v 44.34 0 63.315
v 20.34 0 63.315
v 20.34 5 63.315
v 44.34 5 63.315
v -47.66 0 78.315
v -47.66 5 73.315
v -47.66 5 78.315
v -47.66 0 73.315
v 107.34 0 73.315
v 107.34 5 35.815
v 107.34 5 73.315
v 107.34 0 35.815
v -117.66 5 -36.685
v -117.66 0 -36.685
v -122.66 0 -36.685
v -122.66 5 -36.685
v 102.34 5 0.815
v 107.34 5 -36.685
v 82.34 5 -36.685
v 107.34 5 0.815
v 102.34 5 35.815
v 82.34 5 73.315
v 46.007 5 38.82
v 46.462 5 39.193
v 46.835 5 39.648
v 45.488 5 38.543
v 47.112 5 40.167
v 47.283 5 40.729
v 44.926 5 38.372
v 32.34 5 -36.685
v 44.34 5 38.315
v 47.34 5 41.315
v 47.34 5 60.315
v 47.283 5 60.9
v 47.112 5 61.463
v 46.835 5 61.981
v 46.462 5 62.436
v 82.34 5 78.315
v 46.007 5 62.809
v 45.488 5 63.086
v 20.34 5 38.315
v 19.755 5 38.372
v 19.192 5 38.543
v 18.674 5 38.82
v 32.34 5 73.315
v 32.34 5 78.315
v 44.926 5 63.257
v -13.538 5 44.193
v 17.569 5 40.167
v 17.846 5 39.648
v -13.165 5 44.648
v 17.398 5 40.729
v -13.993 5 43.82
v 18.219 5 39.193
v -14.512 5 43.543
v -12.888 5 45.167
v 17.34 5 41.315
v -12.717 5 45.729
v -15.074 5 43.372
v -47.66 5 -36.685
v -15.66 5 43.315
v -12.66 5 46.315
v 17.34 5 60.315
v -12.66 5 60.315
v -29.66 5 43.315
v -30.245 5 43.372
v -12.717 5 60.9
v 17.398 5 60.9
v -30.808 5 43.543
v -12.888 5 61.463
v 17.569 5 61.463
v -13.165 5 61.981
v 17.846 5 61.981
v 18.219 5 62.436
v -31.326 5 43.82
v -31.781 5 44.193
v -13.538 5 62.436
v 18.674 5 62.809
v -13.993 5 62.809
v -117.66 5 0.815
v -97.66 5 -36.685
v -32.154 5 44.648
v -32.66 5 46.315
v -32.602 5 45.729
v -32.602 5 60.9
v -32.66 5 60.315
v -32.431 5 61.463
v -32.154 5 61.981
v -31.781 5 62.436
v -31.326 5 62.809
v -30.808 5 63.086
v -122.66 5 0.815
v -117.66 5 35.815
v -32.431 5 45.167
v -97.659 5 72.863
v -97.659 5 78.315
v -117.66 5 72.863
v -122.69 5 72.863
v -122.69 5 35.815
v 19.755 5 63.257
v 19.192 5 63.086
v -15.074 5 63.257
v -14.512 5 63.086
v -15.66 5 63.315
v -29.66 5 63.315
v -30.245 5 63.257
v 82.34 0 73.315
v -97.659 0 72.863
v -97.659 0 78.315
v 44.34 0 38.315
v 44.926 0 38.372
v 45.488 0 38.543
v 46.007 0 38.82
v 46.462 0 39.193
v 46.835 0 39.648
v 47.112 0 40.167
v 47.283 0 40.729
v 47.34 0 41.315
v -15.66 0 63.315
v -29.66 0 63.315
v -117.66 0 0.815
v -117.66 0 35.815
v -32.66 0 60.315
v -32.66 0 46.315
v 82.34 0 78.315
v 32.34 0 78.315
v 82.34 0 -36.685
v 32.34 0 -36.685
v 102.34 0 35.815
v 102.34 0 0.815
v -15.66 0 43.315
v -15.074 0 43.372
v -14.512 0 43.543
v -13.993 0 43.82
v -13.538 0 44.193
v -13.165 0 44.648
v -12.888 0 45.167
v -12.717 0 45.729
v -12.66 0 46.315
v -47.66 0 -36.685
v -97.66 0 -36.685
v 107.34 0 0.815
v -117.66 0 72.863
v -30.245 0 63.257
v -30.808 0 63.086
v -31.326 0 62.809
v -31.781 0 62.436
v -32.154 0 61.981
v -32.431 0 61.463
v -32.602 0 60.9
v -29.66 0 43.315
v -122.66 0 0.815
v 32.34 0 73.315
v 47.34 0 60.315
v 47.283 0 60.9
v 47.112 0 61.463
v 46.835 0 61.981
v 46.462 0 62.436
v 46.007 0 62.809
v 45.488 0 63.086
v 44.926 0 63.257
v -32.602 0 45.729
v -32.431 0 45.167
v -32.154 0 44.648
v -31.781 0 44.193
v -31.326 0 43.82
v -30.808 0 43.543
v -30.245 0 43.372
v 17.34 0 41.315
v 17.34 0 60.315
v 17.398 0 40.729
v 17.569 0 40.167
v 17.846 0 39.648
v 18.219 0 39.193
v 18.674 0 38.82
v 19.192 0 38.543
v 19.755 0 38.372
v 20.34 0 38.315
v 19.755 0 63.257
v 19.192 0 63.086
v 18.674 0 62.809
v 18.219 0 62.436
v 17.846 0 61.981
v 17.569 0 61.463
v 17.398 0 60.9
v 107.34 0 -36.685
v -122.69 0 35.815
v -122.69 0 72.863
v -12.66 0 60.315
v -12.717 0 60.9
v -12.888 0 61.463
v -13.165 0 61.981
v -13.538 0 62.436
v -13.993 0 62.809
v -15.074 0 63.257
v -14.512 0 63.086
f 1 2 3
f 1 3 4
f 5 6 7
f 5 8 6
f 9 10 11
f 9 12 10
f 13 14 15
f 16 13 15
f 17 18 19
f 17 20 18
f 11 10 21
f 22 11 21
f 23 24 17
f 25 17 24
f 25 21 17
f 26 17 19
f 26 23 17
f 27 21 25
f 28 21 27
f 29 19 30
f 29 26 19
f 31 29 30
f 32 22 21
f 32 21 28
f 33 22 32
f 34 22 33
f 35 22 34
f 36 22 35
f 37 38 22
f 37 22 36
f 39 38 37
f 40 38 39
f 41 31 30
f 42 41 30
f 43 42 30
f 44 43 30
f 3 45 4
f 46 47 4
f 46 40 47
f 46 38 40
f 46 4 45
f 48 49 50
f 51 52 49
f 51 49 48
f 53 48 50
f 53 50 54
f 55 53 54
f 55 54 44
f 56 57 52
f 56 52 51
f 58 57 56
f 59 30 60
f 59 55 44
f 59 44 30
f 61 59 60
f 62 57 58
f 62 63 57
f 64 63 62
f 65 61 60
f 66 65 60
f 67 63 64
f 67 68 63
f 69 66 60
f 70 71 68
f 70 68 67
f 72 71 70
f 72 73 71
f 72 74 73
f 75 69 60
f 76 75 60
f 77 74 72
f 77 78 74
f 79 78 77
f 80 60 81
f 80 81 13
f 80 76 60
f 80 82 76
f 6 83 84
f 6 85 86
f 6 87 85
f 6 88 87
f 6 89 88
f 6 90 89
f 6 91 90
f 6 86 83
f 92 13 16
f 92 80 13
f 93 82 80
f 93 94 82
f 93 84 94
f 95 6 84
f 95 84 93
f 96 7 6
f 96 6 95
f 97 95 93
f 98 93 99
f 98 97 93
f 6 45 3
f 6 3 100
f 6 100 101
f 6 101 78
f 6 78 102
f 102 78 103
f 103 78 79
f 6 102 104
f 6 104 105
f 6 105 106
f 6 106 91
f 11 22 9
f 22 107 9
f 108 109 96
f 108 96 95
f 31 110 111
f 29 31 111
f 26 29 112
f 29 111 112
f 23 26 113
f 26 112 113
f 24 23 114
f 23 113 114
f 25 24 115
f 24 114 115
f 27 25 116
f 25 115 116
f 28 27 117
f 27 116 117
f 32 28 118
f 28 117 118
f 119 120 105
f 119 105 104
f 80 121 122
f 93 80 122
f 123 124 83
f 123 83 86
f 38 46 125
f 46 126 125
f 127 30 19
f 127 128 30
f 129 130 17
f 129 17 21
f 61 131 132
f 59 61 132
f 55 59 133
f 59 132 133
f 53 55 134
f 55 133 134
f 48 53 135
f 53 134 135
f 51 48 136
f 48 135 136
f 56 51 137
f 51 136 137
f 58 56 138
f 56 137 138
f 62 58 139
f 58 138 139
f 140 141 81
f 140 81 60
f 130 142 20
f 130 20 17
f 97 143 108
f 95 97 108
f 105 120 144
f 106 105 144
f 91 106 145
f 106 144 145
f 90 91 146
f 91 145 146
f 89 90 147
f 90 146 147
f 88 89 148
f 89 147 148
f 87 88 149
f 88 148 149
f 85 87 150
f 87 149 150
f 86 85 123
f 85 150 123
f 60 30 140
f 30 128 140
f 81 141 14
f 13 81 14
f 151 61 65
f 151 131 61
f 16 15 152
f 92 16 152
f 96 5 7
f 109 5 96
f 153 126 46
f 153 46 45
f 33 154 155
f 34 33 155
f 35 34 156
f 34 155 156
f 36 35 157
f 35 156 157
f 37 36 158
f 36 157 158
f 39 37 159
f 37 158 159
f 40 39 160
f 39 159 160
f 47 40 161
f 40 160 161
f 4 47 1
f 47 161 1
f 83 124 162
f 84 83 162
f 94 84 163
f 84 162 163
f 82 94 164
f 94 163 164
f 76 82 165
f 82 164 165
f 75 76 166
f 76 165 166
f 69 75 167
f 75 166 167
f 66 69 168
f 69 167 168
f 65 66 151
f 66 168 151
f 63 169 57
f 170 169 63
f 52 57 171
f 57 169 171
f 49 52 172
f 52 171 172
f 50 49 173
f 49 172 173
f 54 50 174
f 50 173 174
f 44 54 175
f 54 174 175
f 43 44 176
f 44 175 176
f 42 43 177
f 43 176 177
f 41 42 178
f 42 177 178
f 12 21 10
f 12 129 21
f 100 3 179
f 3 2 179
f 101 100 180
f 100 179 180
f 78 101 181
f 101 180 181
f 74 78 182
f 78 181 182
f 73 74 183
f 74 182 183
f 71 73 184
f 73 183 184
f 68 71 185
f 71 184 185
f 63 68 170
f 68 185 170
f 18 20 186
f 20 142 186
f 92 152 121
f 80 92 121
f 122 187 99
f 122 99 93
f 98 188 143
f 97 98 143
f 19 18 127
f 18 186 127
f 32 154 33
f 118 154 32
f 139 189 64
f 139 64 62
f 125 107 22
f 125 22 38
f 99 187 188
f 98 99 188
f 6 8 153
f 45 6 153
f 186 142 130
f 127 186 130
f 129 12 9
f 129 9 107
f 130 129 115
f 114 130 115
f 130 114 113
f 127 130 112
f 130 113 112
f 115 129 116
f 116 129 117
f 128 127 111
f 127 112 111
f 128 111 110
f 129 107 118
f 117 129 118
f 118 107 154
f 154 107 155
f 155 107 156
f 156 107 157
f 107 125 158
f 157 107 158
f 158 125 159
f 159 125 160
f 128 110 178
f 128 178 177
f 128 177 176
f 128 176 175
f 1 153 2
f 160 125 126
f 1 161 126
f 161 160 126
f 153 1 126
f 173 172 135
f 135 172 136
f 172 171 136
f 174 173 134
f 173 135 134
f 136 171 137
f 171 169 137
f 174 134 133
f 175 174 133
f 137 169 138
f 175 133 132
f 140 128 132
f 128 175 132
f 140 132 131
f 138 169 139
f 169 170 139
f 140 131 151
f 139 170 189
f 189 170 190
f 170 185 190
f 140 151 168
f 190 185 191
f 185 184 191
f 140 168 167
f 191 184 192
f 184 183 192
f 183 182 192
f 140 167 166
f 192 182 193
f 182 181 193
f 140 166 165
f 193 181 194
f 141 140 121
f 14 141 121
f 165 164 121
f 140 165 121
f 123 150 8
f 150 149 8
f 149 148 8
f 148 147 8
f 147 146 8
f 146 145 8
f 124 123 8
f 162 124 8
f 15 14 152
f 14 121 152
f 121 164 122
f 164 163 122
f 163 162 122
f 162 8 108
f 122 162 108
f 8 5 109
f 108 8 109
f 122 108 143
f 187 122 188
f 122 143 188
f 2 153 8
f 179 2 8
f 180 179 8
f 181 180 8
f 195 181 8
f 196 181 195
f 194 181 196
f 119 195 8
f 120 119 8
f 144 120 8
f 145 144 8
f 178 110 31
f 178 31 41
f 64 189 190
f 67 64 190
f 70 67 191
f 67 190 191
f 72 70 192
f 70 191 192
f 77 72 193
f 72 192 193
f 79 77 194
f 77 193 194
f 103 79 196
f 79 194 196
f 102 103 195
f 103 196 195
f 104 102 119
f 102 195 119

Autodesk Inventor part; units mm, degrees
ref_plane "YZ Plane" through (0, 0, 0) normal (1, 0, 0) x (0, 1, 0)
ref_plane "XZ Plane" through (0, 0, 0) normal (0, 1, 0) x (-1, 0, 0)
ref_plane "XY Plane" through (0, 0, 0) normal (0, 0, 1) x (1, 0, 0)
sketch "Sketch1" plane through (0, 0, 0) normal (0, 1, 0) x (-1, 0, 0)
  line L0 (47.6597, 73.3148) -> (47.6597, 78.3148)
  line L1 (97.6593, 78.3148) -> (97.6593, 72.863)
  line L2 (-82.3403, 73.3148) -> (-82.3403, 78.3148)
  line L3 (-32.3403, 78.3148) -> (-32.3403, 73.3148)
  line L4 (117.6597, 72.863) -> (97.6593, 72.863)
  line L5 (47.6597, 73.3148) -> (-32.3403, 73.3148)
  line L6 (-82.3403, 73.3148) -> (-107.3403, 73.3148)
  line L7 (-20.3403, 63.3147) -> (-44.3403, 63.3147)
  line L8 (-47.3403, 60.3147) -> (-47.3403, 41.3147)
  line L9 (-44.3403, 38.3147) -> (-20.3403, 38.3147)
  line L10 (-17.3403, 41.3147) -> (-17.3403, 60.3147)
  line L11 (29.6597, 63.3147) -> (15.6597, 63.3147)
  line L12 (12.6597, 60.3147) -> (12.6597, 46.3147)
  line L13 (15.6597, 43.3147) -> (29.6597, 43.3147)
  line L14 (32.6597, 46.3147) -> (32.6597, 60.3147)
  arc A0 (29.6597, 43.3147) -> (32.6597, 46.3147) centre (29.6597, 46.3147) ccw
  arc A1 (32.6597, 60.3147) -> (29.6597, 63.3147) centre (29.6597, 60.3147) ccw
  arc A2 (15.6597, 63.3147) -> (12.6597, 60.3147) centre (15.6597, 60.3147) ccw
  arc A3 (12.6597, 46.3147) -> (15.6597, 43.3147) centre (15.6597, 46.3147) ccw
  arc A4 (-20.3403, 38.3147) -> (-17.3403, 41.3147) centre (-20.3403, 41.3147) ccw
  arc A5 (-47.3403, 41.3147) -> (-44.3403, 38.3147) centre (-44.3403, 41.3147) ccw
  arc A6 (-44.3403, 63.3147) -> (-47.3403, 60.3147) centre (-44.3403, 60.3147) ccw
  arc A7 (-17.3403, 60.3147) -> (-20.3403, 63.3147) centre (-20.3403, 60.3147) ccw
  line L15 (97.6597, -36.6853) -> (117.6597, -36.6853)
  line L16 (-107.3403, -36.6853) -> (-82.3403, -36.6853)
  line L17 (-32.3403, -36.6853) -> (47.6597, -36.6853)
  line L18 (-107.3403, 0.8147) -> (-107.3403, -36.6853)
  line L19 (-107.3403, 0.8147) -> (-102.3403, 0.8147)
  line L20 (-102.3403, 0.8147) -> (-102.3403, 35.8147)
  line L21 (-102.3403, 35.8147) -> (-107.3403, 35.8147)
  line L22 (-107.3403, 35.8147) -> (-107.3403, 73.3148)
  line L23 (117.6597, -36.6853) -> (122.6597, -36.6853)
  line L24 (122.6597, -36.6853) -> (122.6597, 0.8147)
  line L25 (122.6597, 0.8147) -> (117.6597, 0.8147)
  line L26 (117.6597, 0.8147) -> (117.6597, 35.8147)
  line L27 (122.6902, 35.8147) -> (122.6902, 72.863)
  line L28 (122.6902, 72.863) -> (117.6597, 72.863)
  line L29 (122.6902, 35.8147) -> (117.6597, 35.8147)
  line L30 (97.6597, -36.6853) -> (-82.3403, -36.6853)
  line L31 (-32.3403, 73.3148) -> (-32.3403, 78.3148)
  line L32 (-32.3403, 78.3148) -> (-82.3403, 78.3148)
  line L33 (47.6597, 78.3148) -> (97.6593, 78.3148)
  point P0 (-17.3403, 63.3147)
  point P1 (-47.3403, 63.3147)
  point P2 (-47.3403, 38.3147)
  point P3 (32.6597, 63.3147)
  point P4 (12.6597, 63.3147)
  point P5 (12.6597, 43.3147)
  dimension "d4" = 80
  dimension "d19" = 30
  dimension "d20" = 25
  dimension "d28" = 20
  dimension "d29" = 20
  dimension "d30" = 30
  dimension "d31" = 3
  dimension "d41" = 5
  dimension "d53" = 5
extrude "Extrusion3" add sketch "Sketch1" along normal blind 5
properties part number "Part Sisi 3"
